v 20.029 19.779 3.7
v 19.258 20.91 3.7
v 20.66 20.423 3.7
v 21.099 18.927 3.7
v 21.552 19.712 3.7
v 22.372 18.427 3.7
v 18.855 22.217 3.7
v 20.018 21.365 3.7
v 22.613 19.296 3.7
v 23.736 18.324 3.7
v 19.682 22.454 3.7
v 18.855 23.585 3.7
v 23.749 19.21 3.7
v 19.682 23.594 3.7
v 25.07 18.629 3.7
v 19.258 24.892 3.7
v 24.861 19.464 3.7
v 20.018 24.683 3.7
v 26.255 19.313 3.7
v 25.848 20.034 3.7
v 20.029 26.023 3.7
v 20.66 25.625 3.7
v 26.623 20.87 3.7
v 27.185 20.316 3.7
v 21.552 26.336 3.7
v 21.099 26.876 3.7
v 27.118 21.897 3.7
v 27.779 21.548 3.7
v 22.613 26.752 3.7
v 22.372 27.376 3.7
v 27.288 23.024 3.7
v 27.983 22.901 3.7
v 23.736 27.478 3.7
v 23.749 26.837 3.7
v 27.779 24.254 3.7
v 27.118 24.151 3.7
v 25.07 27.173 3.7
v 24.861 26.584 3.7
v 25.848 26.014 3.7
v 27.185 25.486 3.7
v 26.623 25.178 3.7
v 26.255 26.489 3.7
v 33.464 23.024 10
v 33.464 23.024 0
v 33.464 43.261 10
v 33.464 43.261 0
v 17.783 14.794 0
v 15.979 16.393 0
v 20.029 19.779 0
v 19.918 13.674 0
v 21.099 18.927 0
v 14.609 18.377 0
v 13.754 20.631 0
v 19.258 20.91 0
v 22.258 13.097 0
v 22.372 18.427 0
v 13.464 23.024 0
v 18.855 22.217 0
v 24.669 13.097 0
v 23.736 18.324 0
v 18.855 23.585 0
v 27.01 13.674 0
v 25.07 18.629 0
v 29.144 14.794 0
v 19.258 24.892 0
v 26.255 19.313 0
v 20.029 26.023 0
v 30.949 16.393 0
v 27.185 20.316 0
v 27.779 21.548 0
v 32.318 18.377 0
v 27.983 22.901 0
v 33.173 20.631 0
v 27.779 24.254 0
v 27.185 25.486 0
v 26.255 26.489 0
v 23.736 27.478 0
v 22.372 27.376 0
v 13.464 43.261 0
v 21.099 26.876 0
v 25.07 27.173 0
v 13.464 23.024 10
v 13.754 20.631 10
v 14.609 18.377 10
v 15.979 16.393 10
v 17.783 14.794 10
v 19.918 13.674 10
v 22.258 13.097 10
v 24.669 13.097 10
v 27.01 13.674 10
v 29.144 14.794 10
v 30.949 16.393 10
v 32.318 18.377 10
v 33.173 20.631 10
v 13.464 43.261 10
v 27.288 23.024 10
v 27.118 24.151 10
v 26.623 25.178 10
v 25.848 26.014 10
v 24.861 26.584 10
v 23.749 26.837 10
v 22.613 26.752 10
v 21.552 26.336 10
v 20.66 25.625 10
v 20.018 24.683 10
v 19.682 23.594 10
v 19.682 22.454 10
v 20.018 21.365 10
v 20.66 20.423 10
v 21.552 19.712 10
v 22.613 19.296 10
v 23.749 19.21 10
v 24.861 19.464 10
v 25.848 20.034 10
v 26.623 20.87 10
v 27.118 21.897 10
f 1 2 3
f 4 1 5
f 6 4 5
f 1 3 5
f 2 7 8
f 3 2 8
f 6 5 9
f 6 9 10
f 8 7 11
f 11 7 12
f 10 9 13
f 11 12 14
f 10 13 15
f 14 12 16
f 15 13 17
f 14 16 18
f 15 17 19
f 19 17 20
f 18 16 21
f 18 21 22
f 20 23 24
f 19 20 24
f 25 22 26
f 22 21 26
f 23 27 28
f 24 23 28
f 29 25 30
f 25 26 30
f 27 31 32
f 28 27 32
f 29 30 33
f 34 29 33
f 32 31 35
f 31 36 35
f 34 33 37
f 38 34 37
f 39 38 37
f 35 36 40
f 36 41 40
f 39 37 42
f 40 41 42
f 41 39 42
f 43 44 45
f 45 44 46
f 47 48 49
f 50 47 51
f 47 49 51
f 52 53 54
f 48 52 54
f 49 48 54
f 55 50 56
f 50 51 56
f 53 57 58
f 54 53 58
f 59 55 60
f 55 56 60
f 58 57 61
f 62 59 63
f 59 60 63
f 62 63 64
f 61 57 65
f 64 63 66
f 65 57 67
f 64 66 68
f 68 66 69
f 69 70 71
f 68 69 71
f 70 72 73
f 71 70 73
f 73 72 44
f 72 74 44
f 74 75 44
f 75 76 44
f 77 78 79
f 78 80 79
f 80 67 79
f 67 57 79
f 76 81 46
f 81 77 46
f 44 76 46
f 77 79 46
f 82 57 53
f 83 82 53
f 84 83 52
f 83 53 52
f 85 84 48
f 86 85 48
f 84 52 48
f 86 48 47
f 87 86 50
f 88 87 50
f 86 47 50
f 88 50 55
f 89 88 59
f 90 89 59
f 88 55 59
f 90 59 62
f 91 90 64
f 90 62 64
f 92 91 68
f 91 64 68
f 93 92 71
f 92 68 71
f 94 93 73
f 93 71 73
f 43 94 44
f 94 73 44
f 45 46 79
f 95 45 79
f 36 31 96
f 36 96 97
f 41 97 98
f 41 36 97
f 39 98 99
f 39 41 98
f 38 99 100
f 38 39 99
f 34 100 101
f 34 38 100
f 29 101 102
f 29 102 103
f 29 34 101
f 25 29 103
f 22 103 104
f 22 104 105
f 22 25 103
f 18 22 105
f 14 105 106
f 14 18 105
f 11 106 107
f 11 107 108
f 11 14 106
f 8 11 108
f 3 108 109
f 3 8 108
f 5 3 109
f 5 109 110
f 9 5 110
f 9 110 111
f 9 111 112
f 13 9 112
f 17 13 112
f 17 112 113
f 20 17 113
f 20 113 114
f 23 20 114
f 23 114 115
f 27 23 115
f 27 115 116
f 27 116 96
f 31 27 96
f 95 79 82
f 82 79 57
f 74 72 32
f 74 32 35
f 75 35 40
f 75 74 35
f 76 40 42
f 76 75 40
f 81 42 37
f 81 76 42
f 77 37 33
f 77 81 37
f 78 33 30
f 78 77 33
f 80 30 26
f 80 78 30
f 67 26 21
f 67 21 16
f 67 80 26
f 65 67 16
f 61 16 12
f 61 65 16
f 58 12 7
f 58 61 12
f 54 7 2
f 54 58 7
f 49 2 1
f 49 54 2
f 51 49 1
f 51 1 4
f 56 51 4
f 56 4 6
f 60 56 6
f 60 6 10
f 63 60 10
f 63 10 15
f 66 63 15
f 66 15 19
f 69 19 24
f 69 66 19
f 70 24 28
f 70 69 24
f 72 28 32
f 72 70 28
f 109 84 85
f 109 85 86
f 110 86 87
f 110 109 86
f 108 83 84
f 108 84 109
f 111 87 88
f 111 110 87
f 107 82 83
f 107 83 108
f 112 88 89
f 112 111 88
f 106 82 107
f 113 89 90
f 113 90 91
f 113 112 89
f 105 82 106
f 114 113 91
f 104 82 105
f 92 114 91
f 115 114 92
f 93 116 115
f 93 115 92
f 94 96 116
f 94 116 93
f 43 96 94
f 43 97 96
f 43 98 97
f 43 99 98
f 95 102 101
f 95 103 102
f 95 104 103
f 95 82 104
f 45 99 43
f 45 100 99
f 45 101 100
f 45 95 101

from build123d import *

# Parameters (mm, degrees)
F0_R     = 6.1870864942
F0_R_2   = 3.8241120886
F2_DEPTH = 10
F3_R     = 4.5894677587
F4_DEPTH = 3.7


with BuildPart() as f2:
    # F0 (on Top) → F2 (new body)
    with BuildSketch(Plane.XY):
        with BuildLine():
            Line((33.4636883251, 43.2611741126), (13.4636883251, 43.2611741126))
            Line((13.4636883251, 43.2611741126), (13.4636883251, 27.7164801955))
            Line((13.4636883251, 27.7164801955), (13.4636883251, 23.0237431824))
            ThreePointArc((13.4636883251, 23.0237431824), (23.4636883251, 13.0237431824), (33.4636883251, 23.0237431824))
            Line((33.4636883251, 23.0237431824), (33.4636883251, 43.2611741126))
        make_face()
        with Locations((23.4636883251, 23.0237431824)):
            Circle(F0_R, mode=Mode.SUBTRACT)
        with Locations((23.4636883251, 23.0237431824)):
            Circle(F0_R)
        with Locations((23.4636883251, 23.0237431824)):
            Circle(F0_R_2, mode=Mode.SUBTRACT)
    extrude(amount=F2_DEPTH)

    # F3 (on Top) → F4 (cut)
    with BuildSketch(Plane.XY):
        with Locations((23.3934633434, 22.9011047632)):
            Circle(F3_R)
    extrude(amount=F4_DEPTH, mode=Mode.SUBTRACT)


solid = f2.part
